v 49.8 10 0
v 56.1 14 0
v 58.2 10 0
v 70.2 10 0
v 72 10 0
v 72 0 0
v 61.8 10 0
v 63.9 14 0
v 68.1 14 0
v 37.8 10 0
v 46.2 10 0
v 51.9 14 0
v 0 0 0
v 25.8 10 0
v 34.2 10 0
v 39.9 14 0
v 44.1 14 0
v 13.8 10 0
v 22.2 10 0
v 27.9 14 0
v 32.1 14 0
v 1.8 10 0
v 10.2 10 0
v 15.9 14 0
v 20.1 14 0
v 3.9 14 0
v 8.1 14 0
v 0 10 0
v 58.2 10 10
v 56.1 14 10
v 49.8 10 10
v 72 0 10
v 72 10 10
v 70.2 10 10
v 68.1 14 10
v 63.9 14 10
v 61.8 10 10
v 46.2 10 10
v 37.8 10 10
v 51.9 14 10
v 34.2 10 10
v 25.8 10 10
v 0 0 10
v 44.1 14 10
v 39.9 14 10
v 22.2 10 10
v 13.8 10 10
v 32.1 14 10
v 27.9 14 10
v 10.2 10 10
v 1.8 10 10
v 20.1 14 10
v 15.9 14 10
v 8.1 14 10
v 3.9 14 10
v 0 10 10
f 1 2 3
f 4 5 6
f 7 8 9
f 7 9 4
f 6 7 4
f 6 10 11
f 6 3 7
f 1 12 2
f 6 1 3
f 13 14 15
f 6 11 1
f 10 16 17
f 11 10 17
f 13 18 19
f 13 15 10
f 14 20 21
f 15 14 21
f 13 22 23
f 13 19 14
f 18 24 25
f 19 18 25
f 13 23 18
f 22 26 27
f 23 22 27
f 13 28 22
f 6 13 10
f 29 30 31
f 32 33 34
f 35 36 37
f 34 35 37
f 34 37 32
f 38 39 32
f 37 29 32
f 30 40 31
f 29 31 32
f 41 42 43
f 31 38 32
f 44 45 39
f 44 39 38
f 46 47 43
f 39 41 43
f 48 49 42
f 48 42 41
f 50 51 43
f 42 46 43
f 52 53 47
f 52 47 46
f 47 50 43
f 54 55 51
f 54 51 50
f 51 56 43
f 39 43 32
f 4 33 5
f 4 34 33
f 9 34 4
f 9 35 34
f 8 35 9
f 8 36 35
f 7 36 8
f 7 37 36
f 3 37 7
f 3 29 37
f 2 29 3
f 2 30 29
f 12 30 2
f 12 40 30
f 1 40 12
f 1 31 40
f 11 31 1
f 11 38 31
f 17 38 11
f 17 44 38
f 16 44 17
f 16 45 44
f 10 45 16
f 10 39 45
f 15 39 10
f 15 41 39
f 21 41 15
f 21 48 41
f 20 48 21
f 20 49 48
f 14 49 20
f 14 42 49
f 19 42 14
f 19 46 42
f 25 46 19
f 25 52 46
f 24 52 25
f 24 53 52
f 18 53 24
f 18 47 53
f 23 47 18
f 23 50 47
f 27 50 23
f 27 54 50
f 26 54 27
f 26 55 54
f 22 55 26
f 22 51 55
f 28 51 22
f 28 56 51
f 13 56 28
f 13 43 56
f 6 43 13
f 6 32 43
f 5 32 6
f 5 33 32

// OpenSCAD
$fn = 32;

// ----------------------------------------------------------------------
// Gear rack: 6 teeth, pitch 12 mm
// ----------------------------------------------------------------------

// --- parameters (mm) ---
teeth = 6;                // number of teeth
pitch = 12;               // tooth pitch, X
root_w = 8.4;             // tooth width at the root
tip_w = 4.2;              // tooth width at the tip
base_h = 10;              // rack body height, Y
tooth_h = 4;              // tooth height above the body
plate_t = 10;             // rack width, Z (extrusion height)

rack_l = teeth * pitch;  // overall length
total_h = base_h + tooth_h;  // overall height

profile = [[0, 0], [72, 0], [72, 10], [70.2, 10], [68.1, 14], [63.9, 14], [61.8, 10], [58.2, 10], [56.1, 14], [51.9, 14], [49.8, 10], [46.2, 10], [44.1, 14], [39.9, 14], [37.8, 10], [34.2, 10], [32.1, 14], [27.9, 14], [25.8, 10], [22.2, 10], [20.1, 14], [15.9, 14], [13.8, 10], [10.2, 10], [8.1, 14], [3.9, 14], [1.8, 10], [0, 10]];  // primary outline, 28 points, counter clockwise

// --- the one profile operation ---
linear_extrude(height = plate_t) polygon(points = profile);
